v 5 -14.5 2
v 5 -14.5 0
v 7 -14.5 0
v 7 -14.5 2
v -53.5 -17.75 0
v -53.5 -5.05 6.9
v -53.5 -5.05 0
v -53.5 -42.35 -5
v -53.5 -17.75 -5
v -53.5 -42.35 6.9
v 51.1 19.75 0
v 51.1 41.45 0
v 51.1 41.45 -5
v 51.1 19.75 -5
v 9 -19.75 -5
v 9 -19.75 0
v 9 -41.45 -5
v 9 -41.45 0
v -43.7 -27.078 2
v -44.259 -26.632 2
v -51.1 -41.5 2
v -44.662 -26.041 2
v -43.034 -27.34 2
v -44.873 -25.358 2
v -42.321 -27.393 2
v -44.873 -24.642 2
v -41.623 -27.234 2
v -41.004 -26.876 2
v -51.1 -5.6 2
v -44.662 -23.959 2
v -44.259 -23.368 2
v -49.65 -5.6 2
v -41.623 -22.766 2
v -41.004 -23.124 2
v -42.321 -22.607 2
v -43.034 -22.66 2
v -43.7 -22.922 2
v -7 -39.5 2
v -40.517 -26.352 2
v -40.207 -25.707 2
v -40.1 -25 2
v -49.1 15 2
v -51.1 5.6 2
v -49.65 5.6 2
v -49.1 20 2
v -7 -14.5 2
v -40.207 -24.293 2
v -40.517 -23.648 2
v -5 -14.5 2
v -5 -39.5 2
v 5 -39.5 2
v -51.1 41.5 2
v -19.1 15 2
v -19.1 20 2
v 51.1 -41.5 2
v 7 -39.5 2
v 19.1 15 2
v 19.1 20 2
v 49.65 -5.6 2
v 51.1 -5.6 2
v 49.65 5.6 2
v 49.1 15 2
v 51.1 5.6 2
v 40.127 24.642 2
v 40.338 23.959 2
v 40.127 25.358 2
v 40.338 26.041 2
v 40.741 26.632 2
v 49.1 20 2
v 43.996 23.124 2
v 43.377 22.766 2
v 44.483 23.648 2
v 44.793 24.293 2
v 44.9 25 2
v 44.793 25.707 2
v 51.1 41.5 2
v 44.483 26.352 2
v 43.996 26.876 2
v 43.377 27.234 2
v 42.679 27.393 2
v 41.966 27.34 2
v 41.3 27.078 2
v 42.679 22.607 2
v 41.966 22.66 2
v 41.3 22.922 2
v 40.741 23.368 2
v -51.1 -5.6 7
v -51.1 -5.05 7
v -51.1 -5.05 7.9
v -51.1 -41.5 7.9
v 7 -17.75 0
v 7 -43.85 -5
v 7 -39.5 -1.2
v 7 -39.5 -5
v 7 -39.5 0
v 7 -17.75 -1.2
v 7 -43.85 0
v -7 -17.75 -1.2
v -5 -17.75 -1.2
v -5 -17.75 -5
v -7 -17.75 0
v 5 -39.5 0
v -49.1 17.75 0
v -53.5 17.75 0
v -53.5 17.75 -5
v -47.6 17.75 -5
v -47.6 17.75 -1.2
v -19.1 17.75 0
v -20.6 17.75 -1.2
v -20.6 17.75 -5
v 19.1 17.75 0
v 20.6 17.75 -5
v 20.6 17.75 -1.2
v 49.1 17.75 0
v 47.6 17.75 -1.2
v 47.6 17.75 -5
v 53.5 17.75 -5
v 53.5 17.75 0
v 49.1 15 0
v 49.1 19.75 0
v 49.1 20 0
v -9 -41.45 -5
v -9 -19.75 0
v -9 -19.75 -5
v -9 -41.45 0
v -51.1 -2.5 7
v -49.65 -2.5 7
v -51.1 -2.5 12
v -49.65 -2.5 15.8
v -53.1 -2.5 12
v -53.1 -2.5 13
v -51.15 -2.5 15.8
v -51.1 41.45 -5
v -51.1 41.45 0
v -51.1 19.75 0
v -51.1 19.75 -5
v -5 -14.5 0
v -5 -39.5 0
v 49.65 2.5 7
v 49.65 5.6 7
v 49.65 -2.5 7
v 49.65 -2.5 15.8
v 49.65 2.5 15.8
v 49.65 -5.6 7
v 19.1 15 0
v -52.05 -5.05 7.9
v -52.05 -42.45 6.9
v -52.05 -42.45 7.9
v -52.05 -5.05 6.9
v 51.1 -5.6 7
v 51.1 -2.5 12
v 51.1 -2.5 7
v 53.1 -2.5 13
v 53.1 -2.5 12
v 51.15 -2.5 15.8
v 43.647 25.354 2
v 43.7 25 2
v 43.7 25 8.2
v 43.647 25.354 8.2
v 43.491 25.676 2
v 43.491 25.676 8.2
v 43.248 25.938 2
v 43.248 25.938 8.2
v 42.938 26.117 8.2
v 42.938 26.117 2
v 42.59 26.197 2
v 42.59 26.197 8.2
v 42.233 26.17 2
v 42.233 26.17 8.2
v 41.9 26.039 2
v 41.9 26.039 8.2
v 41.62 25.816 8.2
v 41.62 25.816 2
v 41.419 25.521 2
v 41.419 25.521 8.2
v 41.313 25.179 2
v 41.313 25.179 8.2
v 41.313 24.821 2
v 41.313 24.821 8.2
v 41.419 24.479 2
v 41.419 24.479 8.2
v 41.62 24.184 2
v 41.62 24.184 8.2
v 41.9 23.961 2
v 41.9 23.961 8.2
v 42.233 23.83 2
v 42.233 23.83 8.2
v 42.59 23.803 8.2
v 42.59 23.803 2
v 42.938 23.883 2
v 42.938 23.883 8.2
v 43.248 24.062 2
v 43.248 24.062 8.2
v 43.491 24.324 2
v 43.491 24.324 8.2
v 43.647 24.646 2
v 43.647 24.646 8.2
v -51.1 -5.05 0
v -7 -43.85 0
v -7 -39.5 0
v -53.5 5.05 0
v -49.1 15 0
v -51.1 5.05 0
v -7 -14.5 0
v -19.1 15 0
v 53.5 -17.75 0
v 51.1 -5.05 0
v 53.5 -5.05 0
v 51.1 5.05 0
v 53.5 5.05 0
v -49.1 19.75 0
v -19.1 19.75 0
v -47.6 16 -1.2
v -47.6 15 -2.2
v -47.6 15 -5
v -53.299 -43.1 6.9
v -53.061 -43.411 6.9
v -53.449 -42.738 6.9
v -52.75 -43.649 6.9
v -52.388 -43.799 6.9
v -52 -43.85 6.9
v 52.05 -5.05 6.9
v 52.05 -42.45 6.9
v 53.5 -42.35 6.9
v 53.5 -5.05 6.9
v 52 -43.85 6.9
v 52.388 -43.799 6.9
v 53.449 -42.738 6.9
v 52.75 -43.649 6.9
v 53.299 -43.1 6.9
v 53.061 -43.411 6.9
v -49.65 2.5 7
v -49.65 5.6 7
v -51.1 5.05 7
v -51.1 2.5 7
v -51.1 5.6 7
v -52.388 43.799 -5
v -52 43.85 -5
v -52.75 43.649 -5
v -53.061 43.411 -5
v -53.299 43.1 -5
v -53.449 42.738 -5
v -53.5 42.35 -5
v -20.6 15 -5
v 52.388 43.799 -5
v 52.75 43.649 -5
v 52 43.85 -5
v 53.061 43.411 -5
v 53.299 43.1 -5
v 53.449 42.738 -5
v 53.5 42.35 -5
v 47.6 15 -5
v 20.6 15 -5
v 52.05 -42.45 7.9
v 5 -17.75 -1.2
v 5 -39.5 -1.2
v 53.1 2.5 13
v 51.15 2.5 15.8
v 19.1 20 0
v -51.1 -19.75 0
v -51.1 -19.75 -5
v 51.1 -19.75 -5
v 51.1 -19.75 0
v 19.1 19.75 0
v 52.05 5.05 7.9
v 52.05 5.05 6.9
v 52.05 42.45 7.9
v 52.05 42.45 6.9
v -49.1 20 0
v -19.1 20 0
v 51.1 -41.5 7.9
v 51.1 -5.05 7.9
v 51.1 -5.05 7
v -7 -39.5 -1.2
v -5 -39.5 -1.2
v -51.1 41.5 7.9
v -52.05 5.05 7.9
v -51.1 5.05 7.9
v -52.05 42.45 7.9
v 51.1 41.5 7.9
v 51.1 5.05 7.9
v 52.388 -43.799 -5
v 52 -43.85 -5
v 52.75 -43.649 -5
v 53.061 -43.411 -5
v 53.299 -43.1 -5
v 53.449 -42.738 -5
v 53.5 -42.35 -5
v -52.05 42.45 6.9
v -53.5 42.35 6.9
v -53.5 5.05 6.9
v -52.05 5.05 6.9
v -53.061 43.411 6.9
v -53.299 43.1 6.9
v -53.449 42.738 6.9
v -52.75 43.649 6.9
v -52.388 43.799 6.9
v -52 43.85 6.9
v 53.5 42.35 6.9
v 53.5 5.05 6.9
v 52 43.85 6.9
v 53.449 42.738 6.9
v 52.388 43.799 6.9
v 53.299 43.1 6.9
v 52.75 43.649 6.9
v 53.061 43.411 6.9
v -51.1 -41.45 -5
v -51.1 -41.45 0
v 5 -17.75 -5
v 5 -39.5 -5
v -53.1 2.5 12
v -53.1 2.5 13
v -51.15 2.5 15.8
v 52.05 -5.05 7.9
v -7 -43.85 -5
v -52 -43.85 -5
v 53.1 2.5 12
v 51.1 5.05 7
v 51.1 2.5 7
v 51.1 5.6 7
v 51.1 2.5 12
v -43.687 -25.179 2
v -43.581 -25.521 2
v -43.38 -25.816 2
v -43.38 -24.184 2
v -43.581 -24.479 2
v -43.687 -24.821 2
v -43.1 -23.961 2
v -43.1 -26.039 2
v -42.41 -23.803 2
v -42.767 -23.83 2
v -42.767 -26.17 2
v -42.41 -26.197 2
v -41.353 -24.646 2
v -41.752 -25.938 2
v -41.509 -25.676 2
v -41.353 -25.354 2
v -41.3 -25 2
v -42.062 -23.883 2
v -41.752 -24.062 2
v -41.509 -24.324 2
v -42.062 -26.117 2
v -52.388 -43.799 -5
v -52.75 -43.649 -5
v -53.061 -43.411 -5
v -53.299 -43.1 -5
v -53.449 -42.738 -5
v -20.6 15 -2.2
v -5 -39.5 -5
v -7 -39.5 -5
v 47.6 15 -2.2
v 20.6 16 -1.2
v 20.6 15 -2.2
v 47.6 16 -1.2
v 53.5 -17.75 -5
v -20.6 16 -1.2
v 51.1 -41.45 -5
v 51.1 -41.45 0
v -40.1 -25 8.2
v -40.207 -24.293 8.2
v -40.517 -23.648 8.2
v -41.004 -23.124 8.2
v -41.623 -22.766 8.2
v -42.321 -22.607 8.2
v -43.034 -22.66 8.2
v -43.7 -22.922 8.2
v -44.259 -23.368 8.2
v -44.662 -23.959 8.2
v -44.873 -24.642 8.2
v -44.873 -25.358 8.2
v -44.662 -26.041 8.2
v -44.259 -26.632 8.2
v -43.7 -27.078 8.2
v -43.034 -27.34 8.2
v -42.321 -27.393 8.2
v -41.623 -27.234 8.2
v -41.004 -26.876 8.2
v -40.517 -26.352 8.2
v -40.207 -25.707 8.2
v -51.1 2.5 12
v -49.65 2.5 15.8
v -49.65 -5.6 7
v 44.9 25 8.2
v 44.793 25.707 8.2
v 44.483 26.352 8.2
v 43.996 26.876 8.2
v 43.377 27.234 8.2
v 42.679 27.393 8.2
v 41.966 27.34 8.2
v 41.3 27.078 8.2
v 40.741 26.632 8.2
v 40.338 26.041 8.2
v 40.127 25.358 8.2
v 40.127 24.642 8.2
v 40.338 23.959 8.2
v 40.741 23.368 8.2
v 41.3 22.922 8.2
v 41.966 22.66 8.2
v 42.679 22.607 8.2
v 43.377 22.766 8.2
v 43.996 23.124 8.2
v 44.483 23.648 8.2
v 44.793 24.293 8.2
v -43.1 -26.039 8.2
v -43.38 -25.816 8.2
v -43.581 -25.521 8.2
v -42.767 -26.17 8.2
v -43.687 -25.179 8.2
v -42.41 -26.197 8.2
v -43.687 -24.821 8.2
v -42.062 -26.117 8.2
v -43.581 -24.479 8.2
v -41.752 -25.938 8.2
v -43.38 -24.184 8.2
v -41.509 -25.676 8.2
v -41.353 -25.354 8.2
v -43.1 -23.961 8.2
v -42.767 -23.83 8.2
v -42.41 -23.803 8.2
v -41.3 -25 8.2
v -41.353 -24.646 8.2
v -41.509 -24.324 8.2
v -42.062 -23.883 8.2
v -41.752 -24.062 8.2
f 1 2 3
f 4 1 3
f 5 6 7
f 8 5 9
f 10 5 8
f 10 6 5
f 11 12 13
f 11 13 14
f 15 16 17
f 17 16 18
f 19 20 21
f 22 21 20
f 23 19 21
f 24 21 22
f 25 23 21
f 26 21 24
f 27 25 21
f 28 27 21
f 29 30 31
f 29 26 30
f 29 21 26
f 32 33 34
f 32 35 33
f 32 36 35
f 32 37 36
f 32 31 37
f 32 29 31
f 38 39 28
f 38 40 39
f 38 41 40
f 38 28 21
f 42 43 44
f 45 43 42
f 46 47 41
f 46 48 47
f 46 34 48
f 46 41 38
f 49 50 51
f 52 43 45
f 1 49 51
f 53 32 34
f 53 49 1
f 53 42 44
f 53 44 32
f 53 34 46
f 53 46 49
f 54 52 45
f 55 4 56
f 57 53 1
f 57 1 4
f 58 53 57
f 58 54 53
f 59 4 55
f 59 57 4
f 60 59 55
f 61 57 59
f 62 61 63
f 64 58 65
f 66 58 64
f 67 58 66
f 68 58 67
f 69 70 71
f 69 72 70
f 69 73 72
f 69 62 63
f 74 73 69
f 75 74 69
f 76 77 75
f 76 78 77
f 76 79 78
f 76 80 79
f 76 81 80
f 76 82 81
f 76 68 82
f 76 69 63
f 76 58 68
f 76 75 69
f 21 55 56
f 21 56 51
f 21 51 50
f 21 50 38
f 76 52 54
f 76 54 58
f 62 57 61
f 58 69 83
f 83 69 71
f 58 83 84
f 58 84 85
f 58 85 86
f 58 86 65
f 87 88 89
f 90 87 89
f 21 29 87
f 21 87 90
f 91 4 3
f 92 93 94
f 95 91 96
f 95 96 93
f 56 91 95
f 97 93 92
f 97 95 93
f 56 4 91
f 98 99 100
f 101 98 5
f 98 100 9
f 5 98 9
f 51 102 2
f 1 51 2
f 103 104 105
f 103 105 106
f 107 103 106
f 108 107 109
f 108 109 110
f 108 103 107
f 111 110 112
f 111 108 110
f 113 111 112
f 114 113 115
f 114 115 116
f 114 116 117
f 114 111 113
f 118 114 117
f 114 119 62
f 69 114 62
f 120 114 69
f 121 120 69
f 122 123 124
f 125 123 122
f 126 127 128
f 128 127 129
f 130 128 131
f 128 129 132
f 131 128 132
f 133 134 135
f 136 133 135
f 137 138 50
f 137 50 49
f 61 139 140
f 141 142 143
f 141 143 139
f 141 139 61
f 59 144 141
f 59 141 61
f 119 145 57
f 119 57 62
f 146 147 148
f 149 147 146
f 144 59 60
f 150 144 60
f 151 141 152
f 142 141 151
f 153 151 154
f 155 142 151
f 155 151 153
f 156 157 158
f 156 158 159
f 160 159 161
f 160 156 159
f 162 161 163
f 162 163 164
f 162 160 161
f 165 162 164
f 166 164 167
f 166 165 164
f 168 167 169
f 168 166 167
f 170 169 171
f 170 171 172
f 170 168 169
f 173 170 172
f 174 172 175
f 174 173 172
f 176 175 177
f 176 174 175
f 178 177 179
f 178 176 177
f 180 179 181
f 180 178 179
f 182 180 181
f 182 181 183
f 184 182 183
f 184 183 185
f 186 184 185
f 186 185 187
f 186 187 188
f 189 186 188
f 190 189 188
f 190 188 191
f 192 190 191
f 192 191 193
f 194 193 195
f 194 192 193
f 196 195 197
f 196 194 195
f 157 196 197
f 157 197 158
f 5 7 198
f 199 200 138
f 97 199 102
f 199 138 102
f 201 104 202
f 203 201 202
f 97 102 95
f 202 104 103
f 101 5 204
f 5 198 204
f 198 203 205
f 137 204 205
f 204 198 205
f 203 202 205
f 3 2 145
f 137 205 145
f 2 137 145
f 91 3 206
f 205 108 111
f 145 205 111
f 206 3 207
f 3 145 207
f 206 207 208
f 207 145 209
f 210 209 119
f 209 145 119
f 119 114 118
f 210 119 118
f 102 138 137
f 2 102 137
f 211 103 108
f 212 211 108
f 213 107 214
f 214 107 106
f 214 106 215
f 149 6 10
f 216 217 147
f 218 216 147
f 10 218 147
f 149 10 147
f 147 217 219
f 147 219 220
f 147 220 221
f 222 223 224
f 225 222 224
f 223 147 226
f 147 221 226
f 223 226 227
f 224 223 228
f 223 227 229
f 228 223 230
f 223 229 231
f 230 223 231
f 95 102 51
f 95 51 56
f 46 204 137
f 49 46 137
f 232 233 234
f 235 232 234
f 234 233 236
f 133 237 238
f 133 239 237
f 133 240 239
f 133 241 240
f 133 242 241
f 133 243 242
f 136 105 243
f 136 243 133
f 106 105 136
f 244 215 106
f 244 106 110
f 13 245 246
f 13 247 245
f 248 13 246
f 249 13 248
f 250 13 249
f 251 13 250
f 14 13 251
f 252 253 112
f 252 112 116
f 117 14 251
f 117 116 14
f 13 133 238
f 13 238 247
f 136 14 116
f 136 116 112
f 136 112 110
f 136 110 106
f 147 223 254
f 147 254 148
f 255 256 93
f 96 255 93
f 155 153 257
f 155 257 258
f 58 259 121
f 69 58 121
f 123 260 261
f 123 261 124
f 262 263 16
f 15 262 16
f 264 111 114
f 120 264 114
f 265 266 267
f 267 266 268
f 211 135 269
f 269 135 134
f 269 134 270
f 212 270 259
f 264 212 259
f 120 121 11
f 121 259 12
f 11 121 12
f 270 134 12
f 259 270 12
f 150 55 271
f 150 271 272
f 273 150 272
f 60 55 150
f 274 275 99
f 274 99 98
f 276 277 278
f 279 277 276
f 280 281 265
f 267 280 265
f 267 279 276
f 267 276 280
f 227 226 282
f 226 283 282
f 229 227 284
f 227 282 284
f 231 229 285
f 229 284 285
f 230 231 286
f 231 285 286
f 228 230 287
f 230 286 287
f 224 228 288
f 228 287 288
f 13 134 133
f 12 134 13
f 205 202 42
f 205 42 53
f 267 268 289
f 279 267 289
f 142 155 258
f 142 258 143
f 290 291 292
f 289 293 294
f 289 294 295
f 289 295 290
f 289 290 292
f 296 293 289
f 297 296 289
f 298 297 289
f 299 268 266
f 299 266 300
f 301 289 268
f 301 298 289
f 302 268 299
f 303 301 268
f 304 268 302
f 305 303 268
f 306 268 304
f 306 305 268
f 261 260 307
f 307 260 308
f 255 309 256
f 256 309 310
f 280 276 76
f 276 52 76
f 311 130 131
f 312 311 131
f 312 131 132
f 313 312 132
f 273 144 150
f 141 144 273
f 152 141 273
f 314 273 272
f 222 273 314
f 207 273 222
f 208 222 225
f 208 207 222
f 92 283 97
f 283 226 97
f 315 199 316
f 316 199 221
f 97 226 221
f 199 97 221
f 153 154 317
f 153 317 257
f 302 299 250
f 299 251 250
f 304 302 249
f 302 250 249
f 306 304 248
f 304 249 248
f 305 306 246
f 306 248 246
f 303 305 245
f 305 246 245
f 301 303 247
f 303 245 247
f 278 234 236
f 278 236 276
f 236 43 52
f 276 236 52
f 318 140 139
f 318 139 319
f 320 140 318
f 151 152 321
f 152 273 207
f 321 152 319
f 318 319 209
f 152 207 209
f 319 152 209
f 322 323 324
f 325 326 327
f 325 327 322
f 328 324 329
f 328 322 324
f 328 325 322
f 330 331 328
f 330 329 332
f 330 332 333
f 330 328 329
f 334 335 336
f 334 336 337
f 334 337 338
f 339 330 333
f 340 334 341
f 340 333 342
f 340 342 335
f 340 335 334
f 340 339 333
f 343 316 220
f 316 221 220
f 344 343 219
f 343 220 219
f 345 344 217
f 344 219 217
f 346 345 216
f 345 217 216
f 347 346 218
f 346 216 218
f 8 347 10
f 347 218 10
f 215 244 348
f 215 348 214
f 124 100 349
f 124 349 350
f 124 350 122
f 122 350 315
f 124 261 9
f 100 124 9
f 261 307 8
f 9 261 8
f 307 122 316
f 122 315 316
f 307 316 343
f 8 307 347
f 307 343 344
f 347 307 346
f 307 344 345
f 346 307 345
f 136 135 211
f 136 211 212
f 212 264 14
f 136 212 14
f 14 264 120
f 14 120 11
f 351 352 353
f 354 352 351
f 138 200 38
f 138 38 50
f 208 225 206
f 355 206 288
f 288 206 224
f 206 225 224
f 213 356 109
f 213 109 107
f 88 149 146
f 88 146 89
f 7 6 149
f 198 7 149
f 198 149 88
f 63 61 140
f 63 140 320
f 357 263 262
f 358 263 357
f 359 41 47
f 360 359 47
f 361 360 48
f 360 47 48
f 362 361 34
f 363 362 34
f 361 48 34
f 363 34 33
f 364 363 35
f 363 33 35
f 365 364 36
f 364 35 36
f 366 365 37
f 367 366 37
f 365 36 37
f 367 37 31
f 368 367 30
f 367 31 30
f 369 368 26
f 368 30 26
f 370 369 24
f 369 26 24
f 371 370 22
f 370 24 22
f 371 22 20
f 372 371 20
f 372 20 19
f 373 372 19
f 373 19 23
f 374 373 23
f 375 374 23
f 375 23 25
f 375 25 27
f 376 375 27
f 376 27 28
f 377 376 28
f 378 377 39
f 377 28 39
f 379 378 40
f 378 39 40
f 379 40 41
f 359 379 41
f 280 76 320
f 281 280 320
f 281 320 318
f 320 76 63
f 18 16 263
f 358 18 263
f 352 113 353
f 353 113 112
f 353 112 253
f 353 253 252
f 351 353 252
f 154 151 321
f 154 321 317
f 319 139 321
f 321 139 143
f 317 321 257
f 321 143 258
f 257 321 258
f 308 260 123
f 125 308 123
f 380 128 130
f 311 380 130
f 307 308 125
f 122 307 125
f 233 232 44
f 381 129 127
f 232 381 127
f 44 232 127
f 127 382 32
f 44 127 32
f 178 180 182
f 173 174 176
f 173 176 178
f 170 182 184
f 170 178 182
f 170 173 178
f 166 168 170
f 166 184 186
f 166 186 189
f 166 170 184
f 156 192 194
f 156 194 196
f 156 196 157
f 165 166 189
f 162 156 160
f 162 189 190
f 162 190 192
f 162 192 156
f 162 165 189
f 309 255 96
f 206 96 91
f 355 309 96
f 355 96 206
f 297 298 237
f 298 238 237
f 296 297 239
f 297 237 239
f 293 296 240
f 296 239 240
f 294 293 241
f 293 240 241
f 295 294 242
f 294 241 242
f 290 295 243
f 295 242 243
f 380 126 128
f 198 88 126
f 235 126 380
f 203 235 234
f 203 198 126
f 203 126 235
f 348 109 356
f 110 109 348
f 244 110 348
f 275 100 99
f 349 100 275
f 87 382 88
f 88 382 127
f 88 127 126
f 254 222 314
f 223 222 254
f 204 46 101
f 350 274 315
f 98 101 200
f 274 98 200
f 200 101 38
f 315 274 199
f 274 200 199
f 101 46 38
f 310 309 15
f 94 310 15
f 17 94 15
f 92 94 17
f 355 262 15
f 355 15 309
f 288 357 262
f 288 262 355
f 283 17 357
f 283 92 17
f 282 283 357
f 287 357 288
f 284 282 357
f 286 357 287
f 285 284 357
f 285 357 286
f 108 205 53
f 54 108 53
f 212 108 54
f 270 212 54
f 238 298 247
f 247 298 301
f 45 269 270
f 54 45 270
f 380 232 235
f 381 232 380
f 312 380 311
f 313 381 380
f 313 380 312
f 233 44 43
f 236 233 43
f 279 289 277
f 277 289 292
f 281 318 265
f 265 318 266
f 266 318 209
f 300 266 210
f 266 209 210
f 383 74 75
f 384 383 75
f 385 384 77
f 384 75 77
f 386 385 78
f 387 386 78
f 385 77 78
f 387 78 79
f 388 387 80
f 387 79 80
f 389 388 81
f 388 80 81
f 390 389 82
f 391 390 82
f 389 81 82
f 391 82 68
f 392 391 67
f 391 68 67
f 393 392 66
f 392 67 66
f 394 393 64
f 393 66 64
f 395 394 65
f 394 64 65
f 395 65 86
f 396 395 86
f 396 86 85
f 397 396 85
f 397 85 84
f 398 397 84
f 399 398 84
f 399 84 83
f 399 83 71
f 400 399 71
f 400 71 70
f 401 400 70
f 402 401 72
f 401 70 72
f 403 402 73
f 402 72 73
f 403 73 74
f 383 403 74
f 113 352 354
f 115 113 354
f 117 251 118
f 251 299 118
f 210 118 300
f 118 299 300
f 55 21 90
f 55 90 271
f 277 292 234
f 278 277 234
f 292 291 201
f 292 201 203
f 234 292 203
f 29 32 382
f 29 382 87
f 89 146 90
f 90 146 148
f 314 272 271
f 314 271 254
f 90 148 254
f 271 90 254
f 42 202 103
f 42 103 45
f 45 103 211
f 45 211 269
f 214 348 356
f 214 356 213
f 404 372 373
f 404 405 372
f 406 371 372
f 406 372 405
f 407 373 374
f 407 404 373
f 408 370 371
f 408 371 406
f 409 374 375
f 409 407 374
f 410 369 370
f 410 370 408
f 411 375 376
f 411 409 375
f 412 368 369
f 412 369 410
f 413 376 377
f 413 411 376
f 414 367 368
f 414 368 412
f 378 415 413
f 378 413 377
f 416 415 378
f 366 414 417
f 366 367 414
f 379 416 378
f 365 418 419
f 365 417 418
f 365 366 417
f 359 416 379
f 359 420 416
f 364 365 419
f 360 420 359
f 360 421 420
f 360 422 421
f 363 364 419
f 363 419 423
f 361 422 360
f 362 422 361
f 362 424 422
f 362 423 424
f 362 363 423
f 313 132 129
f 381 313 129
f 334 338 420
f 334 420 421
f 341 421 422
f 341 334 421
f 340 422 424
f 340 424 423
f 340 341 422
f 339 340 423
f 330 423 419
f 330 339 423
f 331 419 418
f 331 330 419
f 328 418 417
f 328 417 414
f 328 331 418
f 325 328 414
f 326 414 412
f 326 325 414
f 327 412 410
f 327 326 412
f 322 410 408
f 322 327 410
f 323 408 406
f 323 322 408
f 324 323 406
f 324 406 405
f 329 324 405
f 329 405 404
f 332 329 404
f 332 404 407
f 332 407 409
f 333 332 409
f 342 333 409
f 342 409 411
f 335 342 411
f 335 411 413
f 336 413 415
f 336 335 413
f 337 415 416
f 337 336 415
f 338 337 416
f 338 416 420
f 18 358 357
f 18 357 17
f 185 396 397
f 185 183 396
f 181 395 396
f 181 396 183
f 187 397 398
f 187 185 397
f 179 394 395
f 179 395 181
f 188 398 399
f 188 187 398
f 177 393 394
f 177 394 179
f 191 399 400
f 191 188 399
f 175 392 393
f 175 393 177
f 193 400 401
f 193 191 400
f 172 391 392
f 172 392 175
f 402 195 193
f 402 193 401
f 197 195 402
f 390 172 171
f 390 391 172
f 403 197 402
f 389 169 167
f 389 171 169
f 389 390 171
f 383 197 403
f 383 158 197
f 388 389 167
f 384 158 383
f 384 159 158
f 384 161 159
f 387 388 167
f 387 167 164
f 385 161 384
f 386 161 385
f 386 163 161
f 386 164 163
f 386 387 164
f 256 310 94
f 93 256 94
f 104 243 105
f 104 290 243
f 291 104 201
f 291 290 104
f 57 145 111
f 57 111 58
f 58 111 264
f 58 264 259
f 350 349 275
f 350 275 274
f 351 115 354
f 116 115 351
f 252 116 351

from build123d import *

# Parameters (mm, degrees)
SKETCH_W      = 102.2
SKETCH_H      = 83
SKETCH_W_2    = 30
SKETCH_H_2    = 5
SKETCH_W_3    = 2
SKETCH_H_3    = 25
PAD_DEPTH     = 2
SKETCH001_R   = 2.4
SKETCH001_R_2 = 1.2
PAD001_DEPTH  = 6.2
PAD002_DEPTH  = 6.9
PAD003_DEPTH  = 1
SKETCH004_W   = 1.45
SKETCH004_H   = 11.2
PAD004_DEPTH  = 5
SKETCH005_W   = 1.45
SKETCH005_H   = 5
PAD005_DEPTH  = 5
PAD006_DEPTH  = 5
SKETCH007_W   = 107
SKETCH007_H   = 26.1
SKETCH007_W_2 = 102.2
SKETCH007_H_2 = 21.7
PAD007_DEPTH  = 5
SKETCH008_W   = 27
SKETCH008_H   = 2.75
PAD008_DEPTH  = 3.8
CHAMFER_SIZE  = 1
SKETCH009_W   = 46.5
SKETCH009_H   = 26.1
SKETCH009_W_2 = 42.1
SKETCH009_H_2 = 21.7
PAD009_DEPTH  = 5
SKETCH010_W   = 2
SKETCH010_H   = 21.75
PAD010_DEPTH  = 3.8
FILLET_R      = 1.5


with BuildPart() as part:
    # Sketch → Pad (new body)
    with BuildSketch(Plane.XY):
        Rectangle(SKETCH_W, SKETCH_H)
        with Locations((34.1, 17.5)):
            Rectangle(SKETCH_W_2, SKETCH_H_2, mode=Mode.SUBTRACT)
        with Locations((-34.1, 17.5)):
            Rectangle(SKETCH_W_2, SKETCH_H_2, mode=Mode.SUBTRACT)
        with Locations((6, -27)):
            Rectangle(SKETCH_W_3, SKETCH_H_3, mode=Mode.SUBTRACT)
        with Locations((-6, -27)):
            Rectangle(SKETCH_W_3, SKETCH_H_3, mode=Mode.SUBTRACT)
    extrude(amount=PAD_DEPTH)

    # Sketch001 (on Face22 of Pad) → Pad001 (join)
    with BuildSketch(Plane.XY.offset(2)):
        with Locations((-42.5, -25)):
            Circle(SKETCH001_R)
        with Locations((-42.5, -25)):
            Circle(SKETCH001_R_2, mode=Mode.SUBTRACT)
        with Locations((42.5, 25)):
            Circle(SKETCH001_R)
        with Locations((42.5, 25)):
            Circle(SKETCH001_R_2, mode=Mode.SUBTRACT)
    extrude(amount=PAD001_DEPTH)

    # Sketch002 → Pad002 (join)
    with BuildSketch(Plane.XY):
        Polygon((-51.1, 41.5), (51.1, 41.5), (51.1, 5.05), (53.5, 5.05), (53.5, 43.85), (-53.5, 43.85), (-53.5, 5.05), (-51.1, 5.05), align=None)
    pad002 = extrude(amount=PAD002_DEPTH)

    # Mirrored: Pad002 across XZ
    add(pad002.mirror(Plane.XZ))

    # Sketch003 (on Face36 of Mirrored) → Pad003 (join)
    with BuildSketch(Plane.XY.offset(6.9)):
        Polygon((-51.1, 5.05), (-51.1, 41.5), (51.1, 41.5), (51.1, 5.05), (52.05, 5.05), (52.05, 42.45), (-52.05, 42.45), (-52.05, 5.05), align=None)
    pad003 = extrude(amount=PAD003_DEPTH)

    # Mirrored001: Pad003 across XZ
    add(pad003.mirror(Plane.XZ))

    # Sketch004 (on Face3 of Mirrored001) → Pad004 (join)
    with BuildSketch(Plane.XY.offset(2)):
        with Locations((50.375, 0)):
            Rectangle(SKETCH004_W, SKETCH004_H)
    pad004 = extrude(amount=PAD004_DEPTH)

    # Mirrored002: Pad004 across YZ
    add(pad004.mirror(Plane.YZ))

    # Sketch005 (on Face40 of Mirrored002) → Pad005 (join)
    with BuildSketch(Plane.XY.offset(7)):
        with Locations((50.375, 0)):
            Rectangle(SKETCH005_W, SKETCH005_H)
    pad005 = extrude(amount=PAD005_DEPTH)

    # Mirrored003: Pad005 across YZ
    add(pad005.mirror(Plane.YZ))

    # Sketch006 (on Face2 of Mirrored003) → Pad006 (join)
    with BuildSketch(Plane.XZ.offset(2.5)):
        Polygon((49.65, 12), (51.1, 12), (53.1, 12), (53.1, 13), (51.15, 15.8), (49.65, 15.8), align=None)
    pad006 = extrude(amount=-PAD006_DEPTH)

    # Mirrored004: Pad006 across YZ
    add(pad006.mirror(Plane.YZ))

    # Sketch007 (on Face13 of Mirrored004) → Pad007 (join)
    with BuildSketch(Plane(origin=(0, 0, 0), x_dir=(1, 0, 0), z_dir=(0, 0, -1))):
        with Locations((0, -30.8)):
            Rectangle(SKETCH007_W, SKETCH007_H)
        with Locations((0, -30.6)):
            Rectangle(SKETCH007_W_2, SKETCH007_H_2, mode=Mode.SUBTRACT)
    extrude(amount=PAD007_DEPTH)

    # Sketch008 (on Face70 of Pad007) → Pad008 (join)
    with BuildSketch(Plane(origin=(0, 0, -5), x_dir=(1, 0, 0), z_dir=(0, 0, -1))):
        with Locations((34.1, -16.375)):
            Rectangle(SKETCH008_W, SKETCH008_H)
    pad008 = extrude(amount=-PAD008_DEPTH)

    # Mirrored005: Pad008 across YZ
    add(pad008.mirror(Plane.YZ))

    # Chamfer
    chamfer_edges = [part.edges().sort_by_distance(p)[0] for p in [
        (-34.1, 15, -1.2),
        (34.1, 15, -1.2),
    ]]
    chamfer(chamfer_edges, length=CHAMFER_SIZE)

    # Sketch009 (on Face18 of Chamfer) → Pad009 (join)
    with BuildSketch(Plane(origin=(0, 0, 0), x_dir=(1, 0, 0), z_dir=(0, 0, -1))):
        with Locations((-30.25, 30.8)):
            Rectangle(SKETCH009_W, SKETCH009_H)
        with Locations((-30.05, 30.6)):
            Rectangle(SKETCH009_W_2, SKETCH009_H_2, mode=Mode.SUBTRACT)
    pad009 = extrude(amount=PAD009_DEPTH)

    # Mirrored006: Pad009 across YZ
    add(pad009.mirror(Plane.YZ))

    # Sketch010 (on Face66 of Mirrored006) → Pad010 (join)
    with BuildSketch(Plane(origin=(0, 0, -5), x_dir=(1, 0, 0), z_dir=(0, 0, -1))):
        with Locations((6, 28.625)):
            Rectangle(SKETCH010_W, SKETCH010_H)
    pad010 = extrude(amount=-PAD010_DEPTH)

    # Mirrored007: Pad010 across YZ
    add(pad010.mirror(Plane.YZ))

    # Fillet
    fillet_edges = [part.edges().sort_by_distance(p)[0] for p in [
        (53.5, -43.85, 0.95),
        (-53.5, -43.85, 0.95),
        (53.5, 43.85, 0.95),
        (-53.5, 43.85, 0.95),
    ]]
    fillet(fillet_edges, radius=FILLET_R)


solid = part.part
